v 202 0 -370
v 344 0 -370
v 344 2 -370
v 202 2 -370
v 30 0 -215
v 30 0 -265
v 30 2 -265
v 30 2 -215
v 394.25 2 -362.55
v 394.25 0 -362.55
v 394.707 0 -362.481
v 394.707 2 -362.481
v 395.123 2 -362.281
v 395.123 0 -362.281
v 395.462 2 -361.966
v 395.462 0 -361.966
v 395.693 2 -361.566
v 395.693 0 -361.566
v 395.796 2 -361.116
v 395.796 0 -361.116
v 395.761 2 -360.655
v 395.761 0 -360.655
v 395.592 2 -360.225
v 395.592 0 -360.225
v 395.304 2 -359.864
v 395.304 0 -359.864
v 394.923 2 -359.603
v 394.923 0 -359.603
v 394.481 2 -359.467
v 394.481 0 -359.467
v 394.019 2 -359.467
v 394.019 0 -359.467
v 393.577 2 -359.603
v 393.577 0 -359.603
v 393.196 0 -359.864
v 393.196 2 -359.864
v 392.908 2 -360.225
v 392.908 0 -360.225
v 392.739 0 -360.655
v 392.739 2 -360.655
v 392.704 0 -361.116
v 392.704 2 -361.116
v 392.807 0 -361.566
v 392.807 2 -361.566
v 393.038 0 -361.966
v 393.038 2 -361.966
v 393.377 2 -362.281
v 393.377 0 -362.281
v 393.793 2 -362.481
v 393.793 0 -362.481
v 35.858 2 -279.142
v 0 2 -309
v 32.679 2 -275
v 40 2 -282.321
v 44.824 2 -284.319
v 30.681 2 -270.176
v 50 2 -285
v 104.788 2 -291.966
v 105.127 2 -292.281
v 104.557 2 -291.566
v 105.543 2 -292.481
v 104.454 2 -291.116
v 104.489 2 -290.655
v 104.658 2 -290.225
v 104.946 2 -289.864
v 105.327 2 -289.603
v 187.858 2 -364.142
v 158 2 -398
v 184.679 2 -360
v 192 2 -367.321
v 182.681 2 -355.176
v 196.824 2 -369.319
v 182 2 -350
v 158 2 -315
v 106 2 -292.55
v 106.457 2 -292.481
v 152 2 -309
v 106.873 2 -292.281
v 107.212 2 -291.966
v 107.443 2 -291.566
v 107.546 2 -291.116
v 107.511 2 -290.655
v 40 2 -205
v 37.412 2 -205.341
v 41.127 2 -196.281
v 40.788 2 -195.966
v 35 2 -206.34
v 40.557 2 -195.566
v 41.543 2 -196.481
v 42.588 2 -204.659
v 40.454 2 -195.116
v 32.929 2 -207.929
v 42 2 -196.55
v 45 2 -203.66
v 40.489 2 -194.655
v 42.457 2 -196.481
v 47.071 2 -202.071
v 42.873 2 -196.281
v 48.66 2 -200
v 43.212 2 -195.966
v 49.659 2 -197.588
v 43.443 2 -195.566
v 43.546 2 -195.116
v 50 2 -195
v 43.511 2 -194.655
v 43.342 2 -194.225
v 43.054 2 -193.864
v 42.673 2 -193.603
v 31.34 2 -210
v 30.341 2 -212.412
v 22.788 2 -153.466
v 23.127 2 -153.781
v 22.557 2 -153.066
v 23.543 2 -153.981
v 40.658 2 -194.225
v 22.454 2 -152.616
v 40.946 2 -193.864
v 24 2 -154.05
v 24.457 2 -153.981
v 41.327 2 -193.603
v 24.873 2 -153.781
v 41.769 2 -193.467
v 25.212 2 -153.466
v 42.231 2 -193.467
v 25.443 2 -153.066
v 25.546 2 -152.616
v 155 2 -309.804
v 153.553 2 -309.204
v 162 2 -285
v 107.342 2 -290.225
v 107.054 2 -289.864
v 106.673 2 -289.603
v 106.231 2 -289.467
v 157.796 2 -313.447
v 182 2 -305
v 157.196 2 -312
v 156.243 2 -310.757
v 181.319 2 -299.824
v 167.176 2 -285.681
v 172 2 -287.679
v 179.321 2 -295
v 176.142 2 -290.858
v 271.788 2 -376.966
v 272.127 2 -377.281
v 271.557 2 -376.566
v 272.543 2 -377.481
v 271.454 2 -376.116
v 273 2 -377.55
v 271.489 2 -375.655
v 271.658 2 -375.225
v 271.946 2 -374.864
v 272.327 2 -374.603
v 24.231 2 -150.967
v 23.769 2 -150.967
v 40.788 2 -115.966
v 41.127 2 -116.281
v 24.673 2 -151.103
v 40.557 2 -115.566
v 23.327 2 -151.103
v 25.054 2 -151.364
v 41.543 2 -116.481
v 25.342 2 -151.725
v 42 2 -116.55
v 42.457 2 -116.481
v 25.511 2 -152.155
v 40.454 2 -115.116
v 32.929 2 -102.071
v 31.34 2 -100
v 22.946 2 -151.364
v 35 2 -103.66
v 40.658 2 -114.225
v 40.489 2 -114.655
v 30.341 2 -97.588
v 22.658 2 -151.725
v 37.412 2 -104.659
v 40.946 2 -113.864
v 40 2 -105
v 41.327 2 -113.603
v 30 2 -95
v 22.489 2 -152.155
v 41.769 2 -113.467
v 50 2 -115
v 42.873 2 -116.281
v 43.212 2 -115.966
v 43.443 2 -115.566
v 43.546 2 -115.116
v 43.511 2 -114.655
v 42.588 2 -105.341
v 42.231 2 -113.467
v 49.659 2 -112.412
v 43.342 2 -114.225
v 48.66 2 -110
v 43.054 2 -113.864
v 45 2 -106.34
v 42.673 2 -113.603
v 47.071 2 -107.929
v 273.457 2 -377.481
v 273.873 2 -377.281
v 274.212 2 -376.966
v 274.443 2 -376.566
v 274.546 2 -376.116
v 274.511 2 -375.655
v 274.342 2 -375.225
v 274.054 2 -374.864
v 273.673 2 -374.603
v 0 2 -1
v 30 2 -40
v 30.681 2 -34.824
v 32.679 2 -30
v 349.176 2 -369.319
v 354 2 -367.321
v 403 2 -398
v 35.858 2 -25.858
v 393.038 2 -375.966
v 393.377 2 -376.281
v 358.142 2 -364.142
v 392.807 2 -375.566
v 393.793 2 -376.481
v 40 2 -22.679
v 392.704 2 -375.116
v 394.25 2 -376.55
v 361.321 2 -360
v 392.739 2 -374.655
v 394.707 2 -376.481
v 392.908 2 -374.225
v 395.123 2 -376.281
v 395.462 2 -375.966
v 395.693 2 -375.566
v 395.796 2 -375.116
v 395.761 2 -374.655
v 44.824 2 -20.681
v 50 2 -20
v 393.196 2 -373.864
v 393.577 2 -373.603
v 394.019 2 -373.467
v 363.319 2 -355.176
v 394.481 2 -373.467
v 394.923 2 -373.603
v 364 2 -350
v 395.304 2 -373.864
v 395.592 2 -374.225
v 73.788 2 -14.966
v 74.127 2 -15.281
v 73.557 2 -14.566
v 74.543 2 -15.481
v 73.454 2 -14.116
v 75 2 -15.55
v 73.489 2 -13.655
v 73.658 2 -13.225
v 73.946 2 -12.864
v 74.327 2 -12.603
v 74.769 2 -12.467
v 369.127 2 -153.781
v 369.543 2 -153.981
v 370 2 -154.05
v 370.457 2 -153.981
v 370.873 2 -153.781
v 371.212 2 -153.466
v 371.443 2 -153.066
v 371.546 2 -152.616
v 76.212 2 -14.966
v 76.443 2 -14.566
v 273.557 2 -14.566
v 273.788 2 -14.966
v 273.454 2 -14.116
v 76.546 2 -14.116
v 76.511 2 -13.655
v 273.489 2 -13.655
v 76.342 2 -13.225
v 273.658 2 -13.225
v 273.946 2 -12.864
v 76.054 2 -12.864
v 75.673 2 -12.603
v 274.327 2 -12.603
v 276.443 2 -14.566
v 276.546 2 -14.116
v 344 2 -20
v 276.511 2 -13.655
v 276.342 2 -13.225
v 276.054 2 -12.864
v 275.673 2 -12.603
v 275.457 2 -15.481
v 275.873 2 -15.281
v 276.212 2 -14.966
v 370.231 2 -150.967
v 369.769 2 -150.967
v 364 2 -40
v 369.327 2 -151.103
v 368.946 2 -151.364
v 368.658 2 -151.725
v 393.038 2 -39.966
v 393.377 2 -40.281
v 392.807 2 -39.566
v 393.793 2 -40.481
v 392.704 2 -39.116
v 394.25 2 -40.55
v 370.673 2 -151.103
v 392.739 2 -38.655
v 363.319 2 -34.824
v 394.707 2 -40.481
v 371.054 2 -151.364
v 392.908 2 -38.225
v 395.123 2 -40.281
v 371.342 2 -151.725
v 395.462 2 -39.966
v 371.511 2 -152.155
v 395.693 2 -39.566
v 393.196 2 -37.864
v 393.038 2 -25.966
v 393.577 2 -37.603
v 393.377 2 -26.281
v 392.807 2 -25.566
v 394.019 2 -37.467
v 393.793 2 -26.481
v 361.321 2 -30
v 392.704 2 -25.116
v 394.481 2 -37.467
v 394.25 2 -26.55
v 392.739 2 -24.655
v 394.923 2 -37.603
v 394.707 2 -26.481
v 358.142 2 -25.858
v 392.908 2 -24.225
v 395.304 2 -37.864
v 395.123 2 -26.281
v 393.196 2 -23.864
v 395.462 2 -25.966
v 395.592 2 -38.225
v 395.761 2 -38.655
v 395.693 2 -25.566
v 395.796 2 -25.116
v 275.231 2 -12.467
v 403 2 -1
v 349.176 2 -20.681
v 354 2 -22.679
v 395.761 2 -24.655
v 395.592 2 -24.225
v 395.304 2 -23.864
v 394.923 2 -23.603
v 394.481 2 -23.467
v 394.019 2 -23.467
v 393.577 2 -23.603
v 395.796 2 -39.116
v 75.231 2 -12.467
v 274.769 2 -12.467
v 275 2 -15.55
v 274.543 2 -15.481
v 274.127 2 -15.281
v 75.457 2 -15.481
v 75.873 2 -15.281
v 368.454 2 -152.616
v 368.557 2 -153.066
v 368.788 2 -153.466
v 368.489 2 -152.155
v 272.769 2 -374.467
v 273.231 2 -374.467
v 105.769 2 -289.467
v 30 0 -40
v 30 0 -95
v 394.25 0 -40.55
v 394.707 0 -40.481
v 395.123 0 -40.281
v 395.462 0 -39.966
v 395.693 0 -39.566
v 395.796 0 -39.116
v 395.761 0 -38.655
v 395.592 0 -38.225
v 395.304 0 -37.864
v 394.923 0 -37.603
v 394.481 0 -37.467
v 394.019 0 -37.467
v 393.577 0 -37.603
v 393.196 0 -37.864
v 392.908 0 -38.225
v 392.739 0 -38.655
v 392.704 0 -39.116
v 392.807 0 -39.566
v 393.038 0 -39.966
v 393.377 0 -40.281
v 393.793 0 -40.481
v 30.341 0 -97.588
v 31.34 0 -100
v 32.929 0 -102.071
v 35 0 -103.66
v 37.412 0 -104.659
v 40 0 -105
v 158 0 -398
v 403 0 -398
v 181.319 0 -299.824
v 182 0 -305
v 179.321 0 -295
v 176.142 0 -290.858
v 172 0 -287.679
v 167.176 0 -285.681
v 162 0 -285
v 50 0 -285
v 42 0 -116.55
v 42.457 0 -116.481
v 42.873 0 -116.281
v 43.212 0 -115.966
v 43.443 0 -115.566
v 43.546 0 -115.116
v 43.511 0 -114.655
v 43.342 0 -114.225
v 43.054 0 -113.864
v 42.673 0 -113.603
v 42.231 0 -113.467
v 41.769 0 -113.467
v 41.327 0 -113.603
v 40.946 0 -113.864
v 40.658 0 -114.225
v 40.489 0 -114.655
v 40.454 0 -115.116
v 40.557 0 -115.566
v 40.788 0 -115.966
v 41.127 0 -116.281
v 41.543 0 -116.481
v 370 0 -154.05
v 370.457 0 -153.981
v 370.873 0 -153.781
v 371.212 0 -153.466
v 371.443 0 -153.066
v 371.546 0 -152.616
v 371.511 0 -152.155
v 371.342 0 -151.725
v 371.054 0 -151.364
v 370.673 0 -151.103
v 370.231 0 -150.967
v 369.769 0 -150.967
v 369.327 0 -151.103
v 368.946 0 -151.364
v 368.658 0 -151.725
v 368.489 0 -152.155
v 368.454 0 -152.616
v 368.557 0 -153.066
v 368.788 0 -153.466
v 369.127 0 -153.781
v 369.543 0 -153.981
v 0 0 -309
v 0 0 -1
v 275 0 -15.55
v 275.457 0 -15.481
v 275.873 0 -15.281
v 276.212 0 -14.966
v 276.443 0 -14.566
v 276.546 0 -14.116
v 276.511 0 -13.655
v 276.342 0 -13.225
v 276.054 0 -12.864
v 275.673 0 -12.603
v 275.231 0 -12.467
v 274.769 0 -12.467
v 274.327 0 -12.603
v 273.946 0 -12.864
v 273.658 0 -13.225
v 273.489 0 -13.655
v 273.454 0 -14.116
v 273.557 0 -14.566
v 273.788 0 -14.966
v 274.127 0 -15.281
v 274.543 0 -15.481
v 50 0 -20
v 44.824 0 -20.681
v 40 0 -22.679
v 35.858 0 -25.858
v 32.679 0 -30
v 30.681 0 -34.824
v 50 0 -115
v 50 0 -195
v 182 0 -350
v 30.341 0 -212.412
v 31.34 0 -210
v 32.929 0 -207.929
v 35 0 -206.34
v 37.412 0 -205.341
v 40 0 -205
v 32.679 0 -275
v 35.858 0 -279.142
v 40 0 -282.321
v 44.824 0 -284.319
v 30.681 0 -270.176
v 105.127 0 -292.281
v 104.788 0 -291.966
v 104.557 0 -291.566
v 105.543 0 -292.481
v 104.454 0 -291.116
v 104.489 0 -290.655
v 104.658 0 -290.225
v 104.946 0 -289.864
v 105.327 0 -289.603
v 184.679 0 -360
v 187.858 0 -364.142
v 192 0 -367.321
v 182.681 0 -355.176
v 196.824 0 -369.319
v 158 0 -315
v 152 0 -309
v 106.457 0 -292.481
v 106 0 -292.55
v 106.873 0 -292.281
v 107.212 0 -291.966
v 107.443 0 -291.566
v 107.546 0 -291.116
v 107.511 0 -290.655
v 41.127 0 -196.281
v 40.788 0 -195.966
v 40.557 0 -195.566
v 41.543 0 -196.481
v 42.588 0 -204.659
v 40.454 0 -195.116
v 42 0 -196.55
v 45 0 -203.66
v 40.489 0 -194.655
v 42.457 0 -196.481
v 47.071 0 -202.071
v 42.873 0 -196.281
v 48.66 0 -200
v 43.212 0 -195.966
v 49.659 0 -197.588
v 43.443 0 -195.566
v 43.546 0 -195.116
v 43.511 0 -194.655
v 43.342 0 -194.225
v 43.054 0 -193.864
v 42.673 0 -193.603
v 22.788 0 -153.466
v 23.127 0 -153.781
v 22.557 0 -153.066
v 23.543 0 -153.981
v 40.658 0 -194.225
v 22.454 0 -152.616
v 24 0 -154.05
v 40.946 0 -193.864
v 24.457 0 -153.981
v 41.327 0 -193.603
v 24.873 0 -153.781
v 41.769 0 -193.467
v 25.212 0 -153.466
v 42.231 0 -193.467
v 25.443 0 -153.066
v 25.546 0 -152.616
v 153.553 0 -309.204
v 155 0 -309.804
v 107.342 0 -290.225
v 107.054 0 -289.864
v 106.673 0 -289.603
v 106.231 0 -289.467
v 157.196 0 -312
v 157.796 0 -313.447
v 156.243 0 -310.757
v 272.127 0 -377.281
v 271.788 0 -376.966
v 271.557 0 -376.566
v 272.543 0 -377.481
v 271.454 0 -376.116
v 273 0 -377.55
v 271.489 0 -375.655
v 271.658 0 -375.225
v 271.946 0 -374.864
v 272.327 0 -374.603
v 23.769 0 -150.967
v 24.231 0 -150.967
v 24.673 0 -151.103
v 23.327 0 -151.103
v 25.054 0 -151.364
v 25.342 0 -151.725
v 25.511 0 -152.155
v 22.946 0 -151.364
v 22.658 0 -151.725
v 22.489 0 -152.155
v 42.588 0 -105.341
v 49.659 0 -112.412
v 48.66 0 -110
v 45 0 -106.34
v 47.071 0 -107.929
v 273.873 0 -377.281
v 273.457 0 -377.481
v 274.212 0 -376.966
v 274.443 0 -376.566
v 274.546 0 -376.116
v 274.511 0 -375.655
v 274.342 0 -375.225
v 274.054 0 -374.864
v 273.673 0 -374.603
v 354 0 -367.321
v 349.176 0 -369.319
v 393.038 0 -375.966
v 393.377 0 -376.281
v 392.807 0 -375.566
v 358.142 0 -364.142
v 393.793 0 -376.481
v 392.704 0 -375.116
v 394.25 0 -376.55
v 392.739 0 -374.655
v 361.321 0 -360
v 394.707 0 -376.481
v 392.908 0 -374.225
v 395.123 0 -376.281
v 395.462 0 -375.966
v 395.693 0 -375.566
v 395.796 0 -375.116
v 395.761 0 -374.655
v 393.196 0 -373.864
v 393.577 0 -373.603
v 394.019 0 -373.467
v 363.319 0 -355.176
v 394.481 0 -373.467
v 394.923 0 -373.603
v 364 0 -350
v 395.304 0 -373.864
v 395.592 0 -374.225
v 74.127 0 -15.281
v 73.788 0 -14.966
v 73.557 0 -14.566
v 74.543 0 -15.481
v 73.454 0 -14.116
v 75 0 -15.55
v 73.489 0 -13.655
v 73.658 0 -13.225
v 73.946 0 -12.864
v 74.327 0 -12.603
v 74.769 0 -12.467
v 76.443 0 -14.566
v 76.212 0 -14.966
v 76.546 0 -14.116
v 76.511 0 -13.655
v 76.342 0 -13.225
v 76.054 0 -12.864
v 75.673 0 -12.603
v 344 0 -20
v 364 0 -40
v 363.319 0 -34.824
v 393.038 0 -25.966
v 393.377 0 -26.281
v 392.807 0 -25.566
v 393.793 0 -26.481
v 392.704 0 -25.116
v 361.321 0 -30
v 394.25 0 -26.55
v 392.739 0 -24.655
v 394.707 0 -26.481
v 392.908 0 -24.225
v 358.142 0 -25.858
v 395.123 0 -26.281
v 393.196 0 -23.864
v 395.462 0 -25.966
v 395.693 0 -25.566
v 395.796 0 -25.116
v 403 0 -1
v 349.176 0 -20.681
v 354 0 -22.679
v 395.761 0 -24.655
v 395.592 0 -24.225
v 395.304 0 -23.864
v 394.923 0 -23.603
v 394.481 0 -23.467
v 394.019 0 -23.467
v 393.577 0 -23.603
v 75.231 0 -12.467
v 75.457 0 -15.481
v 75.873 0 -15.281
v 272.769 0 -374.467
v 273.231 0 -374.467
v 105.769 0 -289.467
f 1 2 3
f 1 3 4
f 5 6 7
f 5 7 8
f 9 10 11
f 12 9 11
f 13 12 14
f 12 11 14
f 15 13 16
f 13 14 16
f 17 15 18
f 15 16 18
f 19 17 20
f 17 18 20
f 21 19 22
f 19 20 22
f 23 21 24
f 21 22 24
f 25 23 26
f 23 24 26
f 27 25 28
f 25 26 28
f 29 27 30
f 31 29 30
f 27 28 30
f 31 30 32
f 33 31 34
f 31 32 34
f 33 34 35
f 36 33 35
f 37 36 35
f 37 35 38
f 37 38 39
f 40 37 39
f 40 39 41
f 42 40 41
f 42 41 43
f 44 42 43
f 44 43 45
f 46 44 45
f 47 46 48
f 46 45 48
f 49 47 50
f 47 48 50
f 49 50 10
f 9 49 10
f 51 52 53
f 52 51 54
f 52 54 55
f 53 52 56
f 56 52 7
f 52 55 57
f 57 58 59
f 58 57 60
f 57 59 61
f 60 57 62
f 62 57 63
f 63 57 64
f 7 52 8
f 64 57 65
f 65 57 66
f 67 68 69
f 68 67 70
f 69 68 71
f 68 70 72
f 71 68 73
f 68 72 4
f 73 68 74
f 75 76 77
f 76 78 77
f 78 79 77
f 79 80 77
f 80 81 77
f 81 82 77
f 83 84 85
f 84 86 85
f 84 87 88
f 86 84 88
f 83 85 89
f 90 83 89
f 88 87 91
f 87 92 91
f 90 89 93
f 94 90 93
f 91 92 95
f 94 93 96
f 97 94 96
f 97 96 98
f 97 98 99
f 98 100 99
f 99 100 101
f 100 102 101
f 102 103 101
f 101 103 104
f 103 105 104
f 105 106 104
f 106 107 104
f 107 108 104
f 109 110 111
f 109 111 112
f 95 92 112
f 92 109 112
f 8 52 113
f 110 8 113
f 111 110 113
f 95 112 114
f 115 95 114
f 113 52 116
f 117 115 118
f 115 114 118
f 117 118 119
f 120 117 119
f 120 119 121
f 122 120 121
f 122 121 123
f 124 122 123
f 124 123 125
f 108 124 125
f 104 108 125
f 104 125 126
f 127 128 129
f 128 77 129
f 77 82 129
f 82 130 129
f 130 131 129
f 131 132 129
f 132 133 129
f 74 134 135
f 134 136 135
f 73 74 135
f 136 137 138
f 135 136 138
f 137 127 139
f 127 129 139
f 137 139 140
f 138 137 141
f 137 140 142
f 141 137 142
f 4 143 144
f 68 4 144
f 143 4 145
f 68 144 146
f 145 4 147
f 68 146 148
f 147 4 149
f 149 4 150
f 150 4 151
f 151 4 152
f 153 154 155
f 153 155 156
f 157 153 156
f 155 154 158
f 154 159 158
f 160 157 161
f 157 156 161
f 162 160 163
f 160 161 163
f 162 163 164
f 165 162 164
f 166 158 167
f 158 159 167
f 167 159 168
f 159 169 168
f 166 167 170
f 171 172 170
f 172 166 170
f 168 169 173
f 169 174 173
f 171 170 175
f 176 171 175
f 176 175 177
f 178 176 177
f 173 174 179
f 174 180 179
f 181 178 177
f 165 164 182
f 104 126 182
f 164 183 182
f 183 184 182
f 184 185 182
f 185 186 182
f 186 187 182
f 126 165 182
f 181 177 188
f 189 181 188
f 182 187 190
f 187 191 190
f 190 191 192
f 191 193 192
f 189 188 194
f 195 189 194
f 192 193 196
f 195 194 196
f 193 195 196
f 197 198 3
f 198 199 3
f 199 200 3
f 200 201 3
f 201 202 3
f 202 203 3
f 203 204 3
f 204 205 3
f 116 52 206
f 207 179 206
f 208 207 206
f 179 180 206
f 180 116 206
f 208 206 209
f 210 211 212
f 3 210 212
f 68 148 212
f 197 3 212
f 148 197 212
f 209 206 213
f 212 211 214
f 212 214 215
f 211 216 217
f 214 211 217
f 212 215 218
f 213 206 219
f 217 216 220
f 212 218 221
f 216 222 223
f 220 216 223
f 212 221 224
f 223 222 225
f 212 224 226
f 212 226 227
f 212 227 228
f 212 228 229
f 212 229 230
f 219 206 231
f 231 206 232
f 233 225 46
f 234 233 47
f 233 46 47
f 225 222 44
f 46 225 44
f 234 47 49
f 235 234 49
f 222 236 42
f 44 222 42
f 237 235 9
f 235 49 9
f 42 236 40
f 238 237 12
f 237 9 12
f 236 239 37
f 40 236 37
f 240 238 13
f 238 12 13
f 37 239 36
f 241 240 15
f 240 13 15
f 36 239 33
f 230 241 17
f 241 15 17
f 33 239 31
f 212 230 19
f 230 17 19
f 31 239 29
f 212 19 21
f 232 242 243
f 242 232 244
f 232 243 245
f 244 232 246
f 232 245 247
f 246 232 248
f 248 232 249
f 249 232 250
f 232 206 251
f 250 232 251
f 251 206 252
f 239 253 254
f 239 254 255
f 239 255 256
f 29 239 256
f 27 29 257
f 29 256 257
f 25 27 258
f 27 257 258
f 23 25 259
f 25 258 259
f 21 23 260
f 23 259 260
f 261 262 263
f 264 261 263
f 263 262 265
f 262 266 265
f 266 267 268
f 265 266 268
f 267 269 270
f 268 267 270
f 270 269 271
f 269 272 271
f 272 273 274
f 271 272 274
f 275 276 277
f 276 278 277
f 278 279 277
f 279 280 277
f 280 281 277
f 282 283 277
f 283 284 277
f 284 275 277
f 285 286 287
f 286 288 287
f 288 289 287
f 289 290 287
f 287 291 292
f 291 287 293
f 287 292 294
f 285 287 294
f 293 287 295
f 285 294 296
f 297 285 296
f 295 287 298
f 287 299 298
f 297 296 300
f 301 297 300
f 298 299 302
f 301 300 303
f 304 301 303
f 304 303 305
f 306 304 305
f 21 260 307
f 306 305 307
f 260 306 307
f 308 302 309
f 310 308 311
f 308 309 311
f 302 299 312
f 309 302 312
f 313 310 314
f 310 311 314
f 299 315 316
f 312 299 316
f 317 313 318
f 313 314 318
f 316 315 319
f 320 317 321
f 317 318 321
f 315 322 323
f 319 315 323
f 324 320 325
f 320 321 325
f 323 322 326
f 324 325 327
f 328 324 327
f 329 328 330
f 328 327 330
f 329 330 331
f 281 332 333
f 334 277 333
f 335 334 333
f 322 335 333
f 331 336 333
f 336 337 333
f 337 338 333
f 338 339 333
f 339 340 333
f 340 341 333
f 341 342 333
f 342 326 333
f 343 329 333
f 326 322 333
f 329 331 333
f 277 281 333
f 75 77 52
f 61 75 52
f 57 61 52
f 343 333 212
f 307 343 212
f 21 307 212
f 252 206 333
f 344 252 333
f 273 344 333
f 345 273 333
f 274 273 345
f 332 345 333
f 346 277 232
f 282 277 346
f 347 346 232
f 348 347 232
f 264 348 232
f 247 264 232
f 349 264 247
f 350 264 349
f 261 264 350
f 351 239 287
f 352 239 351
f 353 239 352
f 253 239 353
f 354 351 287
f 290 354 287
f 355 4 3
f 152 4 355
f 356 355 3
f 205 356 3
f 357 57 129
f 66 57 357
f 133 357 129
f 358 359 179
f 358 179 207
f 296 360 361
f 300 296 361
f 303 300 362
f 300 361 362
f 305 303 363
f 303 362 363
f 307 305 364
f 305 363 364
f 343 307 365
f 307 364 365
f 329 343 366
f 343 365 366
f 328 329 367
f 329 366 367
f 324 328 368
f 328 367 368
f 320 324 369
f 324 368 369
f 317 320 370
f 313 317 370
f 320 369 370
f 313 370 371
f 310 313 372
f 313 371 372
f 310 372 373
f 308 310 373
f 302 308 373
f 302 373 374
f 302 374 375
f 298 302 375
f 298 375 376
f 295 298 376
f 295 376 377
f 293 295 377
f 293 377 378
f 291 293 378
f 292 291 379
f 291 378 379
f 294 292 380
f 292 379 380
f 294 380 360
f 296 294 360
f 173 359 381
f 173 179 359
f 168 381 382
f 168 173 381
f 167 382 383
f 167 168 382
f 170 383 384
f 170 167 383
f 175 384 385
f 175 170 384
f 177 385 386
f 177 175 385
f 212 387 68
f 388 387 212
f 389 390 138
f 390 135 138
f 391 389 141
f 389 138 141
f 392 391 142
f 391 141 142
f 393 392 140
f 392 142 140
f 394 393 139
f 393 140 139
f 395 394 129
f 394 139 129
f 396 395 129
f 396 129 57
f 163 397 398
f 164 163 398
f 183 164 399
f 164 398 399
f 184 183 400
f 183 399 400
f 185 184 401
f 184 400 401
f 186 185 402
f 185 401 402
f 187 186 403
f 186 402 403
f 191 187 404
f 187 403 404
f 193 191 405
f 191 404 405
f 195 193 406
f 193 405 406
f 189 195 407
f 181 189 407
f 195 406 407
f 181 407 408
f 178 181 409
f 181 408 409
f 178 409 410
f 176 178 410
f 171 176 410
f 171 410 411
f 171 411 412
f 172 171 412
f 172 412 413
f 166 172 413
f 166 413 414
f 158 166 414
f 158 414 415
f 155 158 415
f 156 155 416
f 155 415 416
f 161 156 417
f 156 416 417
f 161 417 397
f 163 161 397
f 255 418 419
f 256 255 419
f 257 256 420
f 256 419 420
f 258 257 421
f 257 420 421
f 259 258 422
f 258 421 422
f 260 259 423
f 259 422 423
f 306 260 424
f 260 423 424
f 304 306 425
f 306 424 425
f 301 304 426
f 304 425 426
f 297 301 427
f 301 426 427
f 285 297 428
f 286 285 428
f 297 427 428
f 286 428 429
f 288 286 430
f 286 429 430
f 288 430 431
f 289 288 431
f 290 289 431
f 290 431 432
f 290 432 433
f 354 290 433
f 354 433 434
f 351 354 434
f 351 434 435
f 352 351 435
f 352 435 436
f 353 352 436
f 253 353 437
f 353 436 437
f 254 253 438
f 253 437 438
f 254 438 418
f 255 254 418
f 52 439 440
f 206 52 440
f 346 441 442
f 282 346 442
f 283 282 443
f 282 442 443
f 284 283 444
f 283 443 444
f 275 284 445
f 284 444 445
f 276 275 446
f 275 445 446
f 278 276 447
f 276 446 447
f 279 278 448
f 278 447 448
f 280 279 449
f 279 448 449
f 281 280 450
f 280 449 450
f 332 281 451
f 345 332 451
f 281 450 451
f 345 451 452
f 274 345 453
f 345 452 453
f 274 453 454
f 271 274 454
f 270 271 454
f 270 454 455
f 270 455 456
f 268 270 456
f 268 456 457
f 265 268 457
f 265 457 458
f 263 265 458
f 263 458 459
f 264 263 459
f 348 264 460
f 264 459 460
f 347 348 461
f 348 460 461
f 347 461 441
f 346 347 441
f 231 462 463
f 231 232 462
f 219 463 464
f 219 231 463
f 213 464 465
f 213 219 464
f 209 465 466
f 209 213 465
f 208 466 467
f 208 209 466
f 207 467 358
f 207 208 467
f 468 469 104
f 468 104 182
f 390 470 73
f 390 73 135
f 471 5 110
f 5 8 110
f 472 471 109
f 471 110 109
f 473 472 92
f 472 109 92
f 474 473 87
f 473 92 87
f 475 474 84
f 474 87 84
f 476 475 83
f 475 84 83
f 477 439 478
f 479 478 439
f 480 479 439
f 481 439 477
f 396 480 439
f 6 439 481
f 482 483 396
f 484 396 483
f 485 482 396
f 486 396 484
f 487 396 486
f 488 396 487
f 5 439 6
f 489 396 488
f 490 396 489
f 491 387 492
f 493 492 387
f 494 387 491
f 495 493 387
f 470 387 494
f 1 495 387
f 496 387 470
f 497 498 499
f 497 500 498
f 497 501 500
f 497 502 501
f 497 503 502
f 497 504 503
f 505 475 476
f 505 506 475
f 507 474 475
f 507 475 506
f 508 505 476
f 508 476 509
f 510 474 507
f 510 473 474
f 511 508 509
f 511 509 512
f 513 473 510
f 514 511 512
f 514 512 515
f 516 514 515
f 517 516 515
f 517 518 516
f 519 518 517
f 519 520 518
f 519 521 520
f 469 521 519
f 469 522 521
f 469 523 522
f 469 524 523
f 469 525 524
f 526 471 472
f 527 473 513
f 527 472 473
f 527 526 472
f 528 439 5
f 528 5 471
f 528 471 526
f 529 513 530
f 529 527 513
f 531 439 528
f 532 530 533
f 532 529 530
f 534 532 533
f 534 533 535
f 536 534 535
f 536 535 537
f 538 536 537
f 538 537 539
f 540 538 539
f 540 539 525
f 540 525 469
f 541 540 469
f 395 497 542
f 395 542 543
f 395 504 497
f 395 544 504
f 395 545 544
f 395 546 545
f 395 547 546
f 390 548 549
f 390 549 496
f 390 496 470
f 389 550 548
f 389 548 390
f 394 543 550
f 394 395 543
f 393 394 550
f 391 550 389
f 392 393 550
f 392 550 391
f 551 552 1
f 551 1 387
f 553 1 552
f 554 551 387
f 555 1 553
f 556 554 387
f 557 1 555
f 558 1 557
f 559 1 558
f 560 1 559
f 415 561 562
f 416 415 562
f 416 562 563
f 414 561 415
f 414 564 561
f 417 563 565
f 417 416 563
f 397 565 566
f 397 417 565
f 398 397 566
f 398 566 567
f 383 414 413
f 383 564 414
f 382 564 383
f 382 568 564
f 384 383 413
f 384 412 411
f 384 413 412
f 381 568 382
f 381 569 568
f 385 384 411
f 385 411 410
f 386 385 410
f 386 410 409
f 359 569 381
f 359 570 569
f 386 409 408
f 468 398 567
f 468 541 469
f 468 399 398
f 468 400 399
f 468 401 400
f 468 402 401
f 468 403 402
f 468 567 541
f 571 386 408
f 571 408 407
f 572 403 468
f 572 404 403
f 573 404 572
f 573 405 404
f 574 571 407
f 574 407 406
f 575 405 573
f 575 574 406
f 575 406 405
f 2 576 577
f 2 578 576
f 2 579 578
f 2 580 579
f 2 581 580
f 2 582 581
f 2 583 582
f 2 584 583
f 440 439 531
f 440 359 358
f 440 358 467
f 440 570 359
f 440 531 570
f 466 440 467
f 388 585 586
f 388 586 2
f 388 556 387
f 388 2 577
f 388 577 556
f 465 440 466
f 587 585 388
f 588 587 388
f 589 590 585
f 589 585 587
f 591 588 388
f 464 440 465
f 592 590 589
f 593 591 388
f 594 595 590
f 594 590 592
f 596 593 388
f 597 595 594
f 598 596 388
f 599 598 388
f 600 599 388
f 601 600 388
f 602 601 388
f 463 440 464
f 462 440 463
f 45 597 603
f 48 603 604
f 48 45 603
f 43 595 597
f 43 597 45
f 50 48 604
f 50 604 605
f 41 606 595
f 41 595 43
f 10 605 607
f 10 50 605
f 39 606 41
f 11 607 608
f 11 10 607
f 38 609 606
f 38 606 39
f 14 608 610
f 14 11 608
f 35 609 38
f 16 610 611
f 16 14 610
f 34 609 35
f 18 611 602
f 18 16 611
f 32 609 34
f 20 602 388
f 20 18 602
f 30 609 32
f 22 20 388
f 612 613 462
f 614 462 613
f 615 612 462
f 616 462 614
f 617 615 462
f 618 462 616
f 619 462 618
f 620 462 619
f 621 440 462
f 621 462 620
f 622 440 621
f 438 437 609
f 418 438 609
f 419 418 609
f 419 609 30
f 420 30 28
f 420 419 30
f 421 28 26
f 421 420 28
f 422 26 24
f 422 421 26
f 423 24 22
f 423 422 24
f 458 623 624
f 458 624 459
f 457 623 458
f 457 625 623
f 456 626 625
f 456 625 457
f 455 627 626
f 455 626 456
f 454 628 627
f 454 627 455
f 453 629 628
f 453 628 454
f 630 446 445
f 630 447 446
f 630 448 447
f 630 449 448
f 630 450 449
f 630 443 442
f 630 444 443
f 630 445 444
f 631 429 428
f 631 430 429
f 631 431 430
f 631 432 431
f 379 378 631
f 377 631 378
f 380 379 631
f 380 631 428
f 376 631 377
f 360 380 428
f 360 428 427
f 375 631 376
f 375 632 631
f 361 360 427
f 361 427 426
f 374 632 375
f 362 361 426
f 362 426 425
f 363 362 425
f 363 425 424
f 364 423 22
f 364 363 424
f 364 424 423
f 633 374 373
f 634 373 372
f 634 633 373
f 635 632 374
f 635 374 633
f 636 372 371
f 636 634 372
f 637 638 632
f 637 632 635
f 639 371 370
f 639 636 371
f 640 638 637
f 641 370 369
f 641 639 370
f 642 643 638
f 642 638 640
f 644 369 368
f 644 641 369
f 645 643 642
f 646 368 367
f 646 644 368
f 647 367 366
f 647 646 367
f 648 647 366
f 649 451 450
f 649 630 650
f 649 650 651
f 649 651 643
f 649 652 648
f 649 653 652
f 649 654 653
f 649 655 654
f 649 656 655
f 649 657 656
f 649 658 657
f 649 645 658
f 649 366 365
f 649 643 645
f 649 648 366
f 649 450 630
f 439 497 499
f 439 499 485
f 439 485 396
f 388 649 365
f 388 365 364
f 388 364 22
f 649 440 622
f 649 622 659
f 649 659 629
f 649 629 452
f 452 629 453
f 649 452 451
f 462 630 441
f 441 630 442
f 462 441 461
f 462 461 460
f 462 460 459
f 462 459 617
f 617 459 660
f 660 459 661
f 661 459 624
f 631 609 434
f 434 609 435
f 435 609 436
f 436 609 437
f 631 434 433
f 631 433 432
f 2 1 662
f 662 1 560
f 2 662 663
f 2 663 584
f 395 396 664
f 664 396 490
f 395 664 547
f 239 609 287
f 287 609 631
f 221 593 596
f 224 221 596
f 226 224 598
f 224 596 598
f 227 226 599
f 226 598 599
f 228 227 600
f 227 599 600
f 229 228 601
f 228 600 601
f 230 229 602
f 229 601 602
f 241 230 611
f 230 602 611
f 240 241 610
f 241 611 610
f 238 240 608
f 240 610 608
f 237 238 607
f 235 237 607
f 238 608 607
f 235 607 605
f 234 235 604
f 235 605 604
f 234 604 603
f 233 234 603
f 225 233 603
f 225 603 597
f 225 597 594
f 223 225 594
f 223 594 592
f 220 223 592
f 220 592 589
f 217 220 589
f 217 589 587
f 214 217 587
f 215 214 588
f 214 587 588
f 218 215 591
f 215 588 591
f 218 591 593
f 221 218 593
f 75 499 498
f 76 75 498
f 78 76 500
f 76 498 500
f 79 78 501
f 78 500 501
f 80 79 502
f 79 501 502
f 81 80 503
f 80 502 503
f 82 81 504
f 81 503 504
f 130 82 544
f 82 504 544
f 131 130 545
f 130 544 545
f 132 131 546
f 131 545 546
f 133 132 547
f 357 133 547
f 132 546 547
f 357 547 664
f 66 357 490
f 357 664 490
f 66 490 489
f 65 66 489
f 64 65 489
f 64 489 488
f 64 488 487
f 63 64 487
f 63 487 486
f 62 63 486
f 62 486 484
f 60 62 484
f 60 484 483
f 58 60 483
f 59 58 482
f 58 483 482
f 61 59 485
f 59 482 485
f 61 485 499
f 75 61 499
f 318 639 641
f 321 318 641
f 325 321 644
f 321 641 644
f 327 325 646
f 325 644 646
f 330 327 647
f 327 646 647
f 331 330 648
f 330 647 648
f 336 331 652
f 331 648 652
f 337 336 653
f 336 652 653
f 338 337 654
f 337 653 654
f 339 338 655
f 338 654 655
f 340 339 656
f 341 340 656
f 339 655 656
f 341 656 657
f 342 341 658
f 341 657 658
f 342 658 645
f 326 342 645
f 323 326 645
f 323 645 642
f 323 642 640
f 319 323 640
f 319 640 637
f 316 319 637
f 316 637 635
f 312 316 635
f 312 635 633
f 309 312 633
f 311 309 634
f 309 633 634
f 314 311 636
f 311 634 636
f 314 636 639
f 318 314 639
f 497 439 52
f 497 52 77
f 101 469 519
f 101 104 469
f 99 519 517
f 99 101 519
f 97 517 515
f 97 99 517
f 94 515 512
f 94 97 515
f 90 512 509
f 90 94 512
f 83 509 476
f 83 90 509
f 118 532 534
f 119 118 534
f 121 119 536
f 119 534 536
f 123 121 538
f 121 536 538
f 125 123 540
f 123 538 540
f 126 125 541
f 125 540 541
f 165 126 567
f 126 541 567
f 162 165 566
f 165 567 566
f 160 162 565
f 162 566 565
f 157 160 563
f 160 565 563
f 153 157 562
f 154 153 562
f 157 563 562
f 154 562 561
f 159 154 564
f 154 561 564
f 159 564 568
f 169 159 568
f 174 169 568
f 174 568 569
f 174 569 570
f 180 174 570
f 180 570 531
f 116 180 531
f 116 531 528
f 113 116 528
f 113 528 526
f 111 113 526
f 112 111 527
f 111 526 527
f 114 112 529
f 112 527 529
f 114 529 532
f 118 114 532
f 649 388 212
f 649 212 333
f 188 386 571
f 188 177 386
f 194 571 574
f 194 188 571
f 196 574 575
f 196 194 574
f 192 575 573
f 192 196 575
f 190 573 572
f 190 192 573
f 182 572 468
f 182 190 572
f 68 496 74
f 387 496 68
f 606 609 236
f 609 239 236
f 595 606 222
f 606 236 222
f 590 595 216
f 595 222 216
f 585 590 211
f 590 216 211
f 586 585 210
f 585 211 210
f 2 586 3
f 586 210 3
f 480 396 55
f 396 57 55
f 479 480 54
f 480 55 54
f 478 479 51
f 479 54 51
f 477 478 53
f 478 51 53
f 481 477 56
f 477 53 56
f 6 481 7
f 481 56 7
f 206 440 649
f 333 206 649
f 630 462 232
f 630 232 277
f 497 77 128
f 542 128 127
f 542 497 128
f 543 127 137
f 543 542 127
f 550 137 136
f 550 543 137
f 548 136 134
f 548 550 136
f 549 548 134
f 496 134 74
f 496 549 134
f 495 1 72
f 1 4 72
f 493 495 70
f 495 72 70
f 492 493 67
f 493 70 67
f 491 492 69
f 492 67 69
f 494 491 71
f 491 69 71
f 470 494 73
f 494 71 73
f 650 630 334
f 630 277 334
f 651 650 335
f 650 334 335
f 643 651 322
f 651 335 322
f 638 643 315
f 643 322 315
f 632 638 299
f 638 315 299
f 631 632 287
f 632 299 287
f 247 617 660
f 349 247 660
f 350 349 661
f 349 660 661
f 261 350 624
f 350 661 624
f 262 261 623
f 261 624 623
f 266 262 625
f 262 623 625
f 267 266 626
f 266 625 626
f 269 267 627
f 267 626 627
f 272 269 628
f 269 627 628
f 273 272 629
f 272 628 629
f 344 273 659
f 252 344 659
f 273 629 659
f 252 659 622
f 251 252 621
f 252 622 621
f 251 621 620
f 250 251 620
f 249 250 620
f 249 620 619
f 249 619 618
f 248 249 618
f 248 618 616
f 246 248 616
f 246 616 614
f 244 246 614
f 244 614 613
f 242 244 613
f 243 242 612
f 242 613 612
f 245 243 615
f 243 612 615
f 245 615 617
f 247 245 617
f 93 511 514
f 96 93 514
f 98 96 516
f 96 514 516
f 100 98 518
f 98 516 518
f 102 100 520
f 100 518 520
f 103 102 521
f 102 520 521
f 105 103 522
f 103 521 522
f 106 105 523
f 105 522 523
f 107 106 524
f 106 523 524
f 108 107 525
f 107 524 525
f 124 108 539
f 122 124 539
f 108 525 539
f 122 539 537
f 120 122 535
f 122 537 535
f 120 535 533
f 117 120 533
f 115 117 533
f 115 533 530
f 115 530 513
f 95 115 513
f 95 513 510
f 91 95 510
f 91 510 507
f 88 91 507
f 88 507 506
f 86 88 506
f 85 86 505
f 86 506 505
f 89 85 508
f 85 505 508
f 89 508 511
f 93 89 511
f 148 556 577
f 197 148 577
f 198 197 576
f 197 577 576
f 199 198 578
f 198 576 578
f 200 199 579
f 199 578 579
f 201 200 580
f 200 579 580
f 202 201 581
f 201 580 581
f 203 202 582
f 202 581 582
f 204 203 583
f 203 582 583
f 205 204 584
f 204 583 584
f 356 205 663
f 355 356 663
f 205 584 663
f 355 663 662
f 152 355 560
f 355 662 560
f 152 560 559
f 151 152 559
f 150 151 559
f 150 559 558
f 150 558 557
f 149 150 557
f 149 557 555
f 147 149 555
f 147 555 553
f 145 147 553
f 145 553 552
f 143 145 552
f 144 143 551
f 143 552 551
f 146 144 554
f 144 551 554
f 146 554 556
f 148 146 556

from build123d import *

# Parameters (mm, degrees)
CROQUIS1_W              = 404
CROQUIS1_H              = 400
SALIENTE_EXTRUIR1_DEPTH = 2
CROQUIS3_W              = 157
CROQUIS3_H              = 90
CORTAR_EXTRUIR2_DEPTH   = 2
REDONDEO1_R             = 5
CORTAR_EXTRUIR3_DEPTH   = 2
REDONDEO2_R             = 20
CROQUIS6_R              = 1.55
CORTAR_EXTRUIR5_DEPTH   = 2
CROQUIS7_R              = 1.55
CORTAR_EXTRUIR6_DEPTH   = 2
CROQUIS8_W              = 20
CROQUIS8_H              = 100
SALIENTE_EXTRUIR2_DEPTH = 2
REDONDEO3_R             = 10
CROQUIS9_R              = 1.55
CORTAR_EXTRUIR7_DEPTH   = 2
CROQUIS10_OUTSIDE_W     = 519.704
CROQUIS10_OUTSIDE_H     = 515.704
CORTAR_EXTRUIR8_DEPTH   = 10
CROQUIS11_W             = 245
CROQUIS11_H             = 1
CORTAR_EXTRUIR9_DEPTH   = 2
CROQUIS12_W             = 1
CROQUIS12_H             = 308
SALIENTE_EXTRUIR3_DEPTH = 2


with BuildPart() as part:
    # Croquis1 → Saliente-Extruir1 (new body)
    with BuildSketch(Plane(origin=(0, 0, 0), x_dir=(1, 0, 0), z_dir=(0, 1, 0))):
        with Locations((202, 200)):
            Rectangle(CROQUIS1_W, CROQUIS1_H)
    extrude(amount=SALIENTE_EXTRUIR1_DEPTH)

    # Croquis3 → Cortar-Extruir2 (cut)
    with BuildSketch(Plane.XZ):
        with Locations((78.5, -355)):
            Rectangle(CROQUIS3_W, CROQUIS3_H)
    extrude(amount=-CORTAR_EXTRUIR2_DEPTH, mode=Mode.SUBTRACT)

    # Redondeo1
    redondeo1_edges = [part.edges().sort_by_distance(p)[0] for p in [
        (157, 1, -310),
    ]]
    fillet(redondeo1_edges, radius=REDONDEO1_R)

    # Croquis4 → Cortar-Extruir3 (cut)
    with BuildSketch(Plane.XZ):
        Polygon((30, -20), (364, -20), (364, -233.661541009), (364, -370), (182, -370), (182, -285), (30, -285), align=None)
    extrude(amount=-CORTAR_EXTRUIR3_DEPTH, mode=Mode.SUBTRACT)

    # Redondeo2
    redondeo2_edges = [part.edges().sort_by_distance(p)[0] for p in [
        (30, 1, -285),
        (30, 1, -20),
        (364, 1, -20),
        (364, 1, -370),
        (182, 1, -370),
        (182, 1, -285),
    ]]
    fillet(redondeo2_edges, radius=REDONDEO2_R)

    # Croquis6 → Cortar-Extruir5 (cut)
    with BuildSketch(Plane.XZ):
        with Locations(Location((75, -14, 0), (0, 0, 270))):
            Circle(CROQUIS6_R)
        with Locations(Location((275, -14, 0), (0, 0, 270))):
            Circle(CROQUIS6_R)
        with Locations(Location((273, -376, 0), (0, 0, 270))):
            Circle(CROQUIS6_R)
        with Locations(Location((106, -291, 0), (0, 0, 270))):
            Circle(CROQUIS6_R)
        with Locations(Location((24, -152.5, 0), (0, 0, 270))):
            Circle(CROQUIS6_R)
        with Locations(Location((370, -152.5, 0), (0, 0, 270))):
            Circle(CROQUIS6_R)
    extrude(amount=-CORTAR_EXTRUIR5_DEPTH, mode=Mode.SUBTRACT)

    # Croquis7 → Cortar-Extruir6 (cut)
    with BuildSketch(Plane.XZ):
        with Locations(Location((394.25, -25, 0), (0, 0, 270))):
            Circle(CROQUIS7_R)
        with Locations(Location((394.25, -39, 0), (0, 0, 270))):
            Circle(CROQUIS7_R)
        with Locations(Location((394.25, -375, 0), (0, 0, 270))):
            Circle(CROQUIS7_R)
        with Locations(Location((394.25, -361, 0), (0, 0, 270))):
            Circle(CROQUIS7_R)
    extrude(amount=-CORTAR_EXTRUIR6_DEPTH, mode=Mode.SUBTRACT)

    # Croquis8 → Saliente-Extruir2 (add)
    with BuildSketch(Plane.XZ):
        with Locations((40, -155)):
            Rectangle(CROQUIS8_W, CROQUIS8_H)
    extrude(amount=-SALIENTE_EXTRUIR2_DEPTH)

    # Redondeo3
    redondeo3_edges = [part.edges().sort_by_distance(p)[0] for p in [
        (30, 1, -205),
        (30, 1, -105),
    ]]
    fillet(redondeo3_edges, radius=REDONDEO3_R)
    redondeo3_2_edges = [part.edges().sort_by_distance(p)[0] for p in [
        (50, 1, -205),
        (50, 1, -105),
    ]]
    fillet(redondeo3_2_edges, radius=REDONDEO3_R - 0.0001)  # a hair under: the kernel refuses the full size

    # Croquis9 → Cortar-Extruir7 (cut)
    with BuildSketch(Plane.XZ):
        with Locations(Location((42, -115, 0), (0, 0, 270))):
            Circle(CROQUIS9_R)
        with Locations(Location((42, -195, 0), (0, 0, 270))):
            Circle(CROQUIS9_R)
    extrude(amount=-CORTAR_EXTRUIR7_DEPTH, mode=Mode.SUBTRACT)

    # Croquis10 outside → Cortar-Extruir8 (cut)
    with BuildSketch(Plane.XZ):
        with Locations((202, -200)):
            Rectangle(CROQUIS10_OUTSIDE_W, CROQUIS10_OUTSIDE_H)
        with BuildLine():
            Line((1, -309), (152, -309))
            ThreePointArc((152, -309), (156.242640687, -310.757359313), (158, -315))
            Line((158, -315), (158, -399))
            Line((158, -399), (403, -399))
            Line((403, -399), (403, -1))
            Line((403, -1), (1, -1))
            Line((1, -1), (1, -309))
        make_face(mode=Mode.SUBTRACT)
    extrude(amount=-CORTAR_EXTRUIR8_DEPTH, mode=Mode.SUBTRACT)

    # Croquis11 → Cortar-Extruir9 (cut)
    with BuildSketch(Plane.XZ):
        with Locations((280.5, -398.5)):
            Rectangle(CROQUIS11_W, CROQUIS11_H)
    extrude(amount=-CORTAR_EXTRUIR9_DEPTH, mode=Mode.SUBTRACT)

    # Croquis12 → Saliente-Extruir3 (add)
    with BuildSketch(Plane.XZ):
        with Locations((0.5, -155)):
            Rectangle(CROQUIS12_W, CROQUIS12_H)
    extrude(amount=-SALIENTE_EXTRUIR3_DEPTH)


solid = part.part
